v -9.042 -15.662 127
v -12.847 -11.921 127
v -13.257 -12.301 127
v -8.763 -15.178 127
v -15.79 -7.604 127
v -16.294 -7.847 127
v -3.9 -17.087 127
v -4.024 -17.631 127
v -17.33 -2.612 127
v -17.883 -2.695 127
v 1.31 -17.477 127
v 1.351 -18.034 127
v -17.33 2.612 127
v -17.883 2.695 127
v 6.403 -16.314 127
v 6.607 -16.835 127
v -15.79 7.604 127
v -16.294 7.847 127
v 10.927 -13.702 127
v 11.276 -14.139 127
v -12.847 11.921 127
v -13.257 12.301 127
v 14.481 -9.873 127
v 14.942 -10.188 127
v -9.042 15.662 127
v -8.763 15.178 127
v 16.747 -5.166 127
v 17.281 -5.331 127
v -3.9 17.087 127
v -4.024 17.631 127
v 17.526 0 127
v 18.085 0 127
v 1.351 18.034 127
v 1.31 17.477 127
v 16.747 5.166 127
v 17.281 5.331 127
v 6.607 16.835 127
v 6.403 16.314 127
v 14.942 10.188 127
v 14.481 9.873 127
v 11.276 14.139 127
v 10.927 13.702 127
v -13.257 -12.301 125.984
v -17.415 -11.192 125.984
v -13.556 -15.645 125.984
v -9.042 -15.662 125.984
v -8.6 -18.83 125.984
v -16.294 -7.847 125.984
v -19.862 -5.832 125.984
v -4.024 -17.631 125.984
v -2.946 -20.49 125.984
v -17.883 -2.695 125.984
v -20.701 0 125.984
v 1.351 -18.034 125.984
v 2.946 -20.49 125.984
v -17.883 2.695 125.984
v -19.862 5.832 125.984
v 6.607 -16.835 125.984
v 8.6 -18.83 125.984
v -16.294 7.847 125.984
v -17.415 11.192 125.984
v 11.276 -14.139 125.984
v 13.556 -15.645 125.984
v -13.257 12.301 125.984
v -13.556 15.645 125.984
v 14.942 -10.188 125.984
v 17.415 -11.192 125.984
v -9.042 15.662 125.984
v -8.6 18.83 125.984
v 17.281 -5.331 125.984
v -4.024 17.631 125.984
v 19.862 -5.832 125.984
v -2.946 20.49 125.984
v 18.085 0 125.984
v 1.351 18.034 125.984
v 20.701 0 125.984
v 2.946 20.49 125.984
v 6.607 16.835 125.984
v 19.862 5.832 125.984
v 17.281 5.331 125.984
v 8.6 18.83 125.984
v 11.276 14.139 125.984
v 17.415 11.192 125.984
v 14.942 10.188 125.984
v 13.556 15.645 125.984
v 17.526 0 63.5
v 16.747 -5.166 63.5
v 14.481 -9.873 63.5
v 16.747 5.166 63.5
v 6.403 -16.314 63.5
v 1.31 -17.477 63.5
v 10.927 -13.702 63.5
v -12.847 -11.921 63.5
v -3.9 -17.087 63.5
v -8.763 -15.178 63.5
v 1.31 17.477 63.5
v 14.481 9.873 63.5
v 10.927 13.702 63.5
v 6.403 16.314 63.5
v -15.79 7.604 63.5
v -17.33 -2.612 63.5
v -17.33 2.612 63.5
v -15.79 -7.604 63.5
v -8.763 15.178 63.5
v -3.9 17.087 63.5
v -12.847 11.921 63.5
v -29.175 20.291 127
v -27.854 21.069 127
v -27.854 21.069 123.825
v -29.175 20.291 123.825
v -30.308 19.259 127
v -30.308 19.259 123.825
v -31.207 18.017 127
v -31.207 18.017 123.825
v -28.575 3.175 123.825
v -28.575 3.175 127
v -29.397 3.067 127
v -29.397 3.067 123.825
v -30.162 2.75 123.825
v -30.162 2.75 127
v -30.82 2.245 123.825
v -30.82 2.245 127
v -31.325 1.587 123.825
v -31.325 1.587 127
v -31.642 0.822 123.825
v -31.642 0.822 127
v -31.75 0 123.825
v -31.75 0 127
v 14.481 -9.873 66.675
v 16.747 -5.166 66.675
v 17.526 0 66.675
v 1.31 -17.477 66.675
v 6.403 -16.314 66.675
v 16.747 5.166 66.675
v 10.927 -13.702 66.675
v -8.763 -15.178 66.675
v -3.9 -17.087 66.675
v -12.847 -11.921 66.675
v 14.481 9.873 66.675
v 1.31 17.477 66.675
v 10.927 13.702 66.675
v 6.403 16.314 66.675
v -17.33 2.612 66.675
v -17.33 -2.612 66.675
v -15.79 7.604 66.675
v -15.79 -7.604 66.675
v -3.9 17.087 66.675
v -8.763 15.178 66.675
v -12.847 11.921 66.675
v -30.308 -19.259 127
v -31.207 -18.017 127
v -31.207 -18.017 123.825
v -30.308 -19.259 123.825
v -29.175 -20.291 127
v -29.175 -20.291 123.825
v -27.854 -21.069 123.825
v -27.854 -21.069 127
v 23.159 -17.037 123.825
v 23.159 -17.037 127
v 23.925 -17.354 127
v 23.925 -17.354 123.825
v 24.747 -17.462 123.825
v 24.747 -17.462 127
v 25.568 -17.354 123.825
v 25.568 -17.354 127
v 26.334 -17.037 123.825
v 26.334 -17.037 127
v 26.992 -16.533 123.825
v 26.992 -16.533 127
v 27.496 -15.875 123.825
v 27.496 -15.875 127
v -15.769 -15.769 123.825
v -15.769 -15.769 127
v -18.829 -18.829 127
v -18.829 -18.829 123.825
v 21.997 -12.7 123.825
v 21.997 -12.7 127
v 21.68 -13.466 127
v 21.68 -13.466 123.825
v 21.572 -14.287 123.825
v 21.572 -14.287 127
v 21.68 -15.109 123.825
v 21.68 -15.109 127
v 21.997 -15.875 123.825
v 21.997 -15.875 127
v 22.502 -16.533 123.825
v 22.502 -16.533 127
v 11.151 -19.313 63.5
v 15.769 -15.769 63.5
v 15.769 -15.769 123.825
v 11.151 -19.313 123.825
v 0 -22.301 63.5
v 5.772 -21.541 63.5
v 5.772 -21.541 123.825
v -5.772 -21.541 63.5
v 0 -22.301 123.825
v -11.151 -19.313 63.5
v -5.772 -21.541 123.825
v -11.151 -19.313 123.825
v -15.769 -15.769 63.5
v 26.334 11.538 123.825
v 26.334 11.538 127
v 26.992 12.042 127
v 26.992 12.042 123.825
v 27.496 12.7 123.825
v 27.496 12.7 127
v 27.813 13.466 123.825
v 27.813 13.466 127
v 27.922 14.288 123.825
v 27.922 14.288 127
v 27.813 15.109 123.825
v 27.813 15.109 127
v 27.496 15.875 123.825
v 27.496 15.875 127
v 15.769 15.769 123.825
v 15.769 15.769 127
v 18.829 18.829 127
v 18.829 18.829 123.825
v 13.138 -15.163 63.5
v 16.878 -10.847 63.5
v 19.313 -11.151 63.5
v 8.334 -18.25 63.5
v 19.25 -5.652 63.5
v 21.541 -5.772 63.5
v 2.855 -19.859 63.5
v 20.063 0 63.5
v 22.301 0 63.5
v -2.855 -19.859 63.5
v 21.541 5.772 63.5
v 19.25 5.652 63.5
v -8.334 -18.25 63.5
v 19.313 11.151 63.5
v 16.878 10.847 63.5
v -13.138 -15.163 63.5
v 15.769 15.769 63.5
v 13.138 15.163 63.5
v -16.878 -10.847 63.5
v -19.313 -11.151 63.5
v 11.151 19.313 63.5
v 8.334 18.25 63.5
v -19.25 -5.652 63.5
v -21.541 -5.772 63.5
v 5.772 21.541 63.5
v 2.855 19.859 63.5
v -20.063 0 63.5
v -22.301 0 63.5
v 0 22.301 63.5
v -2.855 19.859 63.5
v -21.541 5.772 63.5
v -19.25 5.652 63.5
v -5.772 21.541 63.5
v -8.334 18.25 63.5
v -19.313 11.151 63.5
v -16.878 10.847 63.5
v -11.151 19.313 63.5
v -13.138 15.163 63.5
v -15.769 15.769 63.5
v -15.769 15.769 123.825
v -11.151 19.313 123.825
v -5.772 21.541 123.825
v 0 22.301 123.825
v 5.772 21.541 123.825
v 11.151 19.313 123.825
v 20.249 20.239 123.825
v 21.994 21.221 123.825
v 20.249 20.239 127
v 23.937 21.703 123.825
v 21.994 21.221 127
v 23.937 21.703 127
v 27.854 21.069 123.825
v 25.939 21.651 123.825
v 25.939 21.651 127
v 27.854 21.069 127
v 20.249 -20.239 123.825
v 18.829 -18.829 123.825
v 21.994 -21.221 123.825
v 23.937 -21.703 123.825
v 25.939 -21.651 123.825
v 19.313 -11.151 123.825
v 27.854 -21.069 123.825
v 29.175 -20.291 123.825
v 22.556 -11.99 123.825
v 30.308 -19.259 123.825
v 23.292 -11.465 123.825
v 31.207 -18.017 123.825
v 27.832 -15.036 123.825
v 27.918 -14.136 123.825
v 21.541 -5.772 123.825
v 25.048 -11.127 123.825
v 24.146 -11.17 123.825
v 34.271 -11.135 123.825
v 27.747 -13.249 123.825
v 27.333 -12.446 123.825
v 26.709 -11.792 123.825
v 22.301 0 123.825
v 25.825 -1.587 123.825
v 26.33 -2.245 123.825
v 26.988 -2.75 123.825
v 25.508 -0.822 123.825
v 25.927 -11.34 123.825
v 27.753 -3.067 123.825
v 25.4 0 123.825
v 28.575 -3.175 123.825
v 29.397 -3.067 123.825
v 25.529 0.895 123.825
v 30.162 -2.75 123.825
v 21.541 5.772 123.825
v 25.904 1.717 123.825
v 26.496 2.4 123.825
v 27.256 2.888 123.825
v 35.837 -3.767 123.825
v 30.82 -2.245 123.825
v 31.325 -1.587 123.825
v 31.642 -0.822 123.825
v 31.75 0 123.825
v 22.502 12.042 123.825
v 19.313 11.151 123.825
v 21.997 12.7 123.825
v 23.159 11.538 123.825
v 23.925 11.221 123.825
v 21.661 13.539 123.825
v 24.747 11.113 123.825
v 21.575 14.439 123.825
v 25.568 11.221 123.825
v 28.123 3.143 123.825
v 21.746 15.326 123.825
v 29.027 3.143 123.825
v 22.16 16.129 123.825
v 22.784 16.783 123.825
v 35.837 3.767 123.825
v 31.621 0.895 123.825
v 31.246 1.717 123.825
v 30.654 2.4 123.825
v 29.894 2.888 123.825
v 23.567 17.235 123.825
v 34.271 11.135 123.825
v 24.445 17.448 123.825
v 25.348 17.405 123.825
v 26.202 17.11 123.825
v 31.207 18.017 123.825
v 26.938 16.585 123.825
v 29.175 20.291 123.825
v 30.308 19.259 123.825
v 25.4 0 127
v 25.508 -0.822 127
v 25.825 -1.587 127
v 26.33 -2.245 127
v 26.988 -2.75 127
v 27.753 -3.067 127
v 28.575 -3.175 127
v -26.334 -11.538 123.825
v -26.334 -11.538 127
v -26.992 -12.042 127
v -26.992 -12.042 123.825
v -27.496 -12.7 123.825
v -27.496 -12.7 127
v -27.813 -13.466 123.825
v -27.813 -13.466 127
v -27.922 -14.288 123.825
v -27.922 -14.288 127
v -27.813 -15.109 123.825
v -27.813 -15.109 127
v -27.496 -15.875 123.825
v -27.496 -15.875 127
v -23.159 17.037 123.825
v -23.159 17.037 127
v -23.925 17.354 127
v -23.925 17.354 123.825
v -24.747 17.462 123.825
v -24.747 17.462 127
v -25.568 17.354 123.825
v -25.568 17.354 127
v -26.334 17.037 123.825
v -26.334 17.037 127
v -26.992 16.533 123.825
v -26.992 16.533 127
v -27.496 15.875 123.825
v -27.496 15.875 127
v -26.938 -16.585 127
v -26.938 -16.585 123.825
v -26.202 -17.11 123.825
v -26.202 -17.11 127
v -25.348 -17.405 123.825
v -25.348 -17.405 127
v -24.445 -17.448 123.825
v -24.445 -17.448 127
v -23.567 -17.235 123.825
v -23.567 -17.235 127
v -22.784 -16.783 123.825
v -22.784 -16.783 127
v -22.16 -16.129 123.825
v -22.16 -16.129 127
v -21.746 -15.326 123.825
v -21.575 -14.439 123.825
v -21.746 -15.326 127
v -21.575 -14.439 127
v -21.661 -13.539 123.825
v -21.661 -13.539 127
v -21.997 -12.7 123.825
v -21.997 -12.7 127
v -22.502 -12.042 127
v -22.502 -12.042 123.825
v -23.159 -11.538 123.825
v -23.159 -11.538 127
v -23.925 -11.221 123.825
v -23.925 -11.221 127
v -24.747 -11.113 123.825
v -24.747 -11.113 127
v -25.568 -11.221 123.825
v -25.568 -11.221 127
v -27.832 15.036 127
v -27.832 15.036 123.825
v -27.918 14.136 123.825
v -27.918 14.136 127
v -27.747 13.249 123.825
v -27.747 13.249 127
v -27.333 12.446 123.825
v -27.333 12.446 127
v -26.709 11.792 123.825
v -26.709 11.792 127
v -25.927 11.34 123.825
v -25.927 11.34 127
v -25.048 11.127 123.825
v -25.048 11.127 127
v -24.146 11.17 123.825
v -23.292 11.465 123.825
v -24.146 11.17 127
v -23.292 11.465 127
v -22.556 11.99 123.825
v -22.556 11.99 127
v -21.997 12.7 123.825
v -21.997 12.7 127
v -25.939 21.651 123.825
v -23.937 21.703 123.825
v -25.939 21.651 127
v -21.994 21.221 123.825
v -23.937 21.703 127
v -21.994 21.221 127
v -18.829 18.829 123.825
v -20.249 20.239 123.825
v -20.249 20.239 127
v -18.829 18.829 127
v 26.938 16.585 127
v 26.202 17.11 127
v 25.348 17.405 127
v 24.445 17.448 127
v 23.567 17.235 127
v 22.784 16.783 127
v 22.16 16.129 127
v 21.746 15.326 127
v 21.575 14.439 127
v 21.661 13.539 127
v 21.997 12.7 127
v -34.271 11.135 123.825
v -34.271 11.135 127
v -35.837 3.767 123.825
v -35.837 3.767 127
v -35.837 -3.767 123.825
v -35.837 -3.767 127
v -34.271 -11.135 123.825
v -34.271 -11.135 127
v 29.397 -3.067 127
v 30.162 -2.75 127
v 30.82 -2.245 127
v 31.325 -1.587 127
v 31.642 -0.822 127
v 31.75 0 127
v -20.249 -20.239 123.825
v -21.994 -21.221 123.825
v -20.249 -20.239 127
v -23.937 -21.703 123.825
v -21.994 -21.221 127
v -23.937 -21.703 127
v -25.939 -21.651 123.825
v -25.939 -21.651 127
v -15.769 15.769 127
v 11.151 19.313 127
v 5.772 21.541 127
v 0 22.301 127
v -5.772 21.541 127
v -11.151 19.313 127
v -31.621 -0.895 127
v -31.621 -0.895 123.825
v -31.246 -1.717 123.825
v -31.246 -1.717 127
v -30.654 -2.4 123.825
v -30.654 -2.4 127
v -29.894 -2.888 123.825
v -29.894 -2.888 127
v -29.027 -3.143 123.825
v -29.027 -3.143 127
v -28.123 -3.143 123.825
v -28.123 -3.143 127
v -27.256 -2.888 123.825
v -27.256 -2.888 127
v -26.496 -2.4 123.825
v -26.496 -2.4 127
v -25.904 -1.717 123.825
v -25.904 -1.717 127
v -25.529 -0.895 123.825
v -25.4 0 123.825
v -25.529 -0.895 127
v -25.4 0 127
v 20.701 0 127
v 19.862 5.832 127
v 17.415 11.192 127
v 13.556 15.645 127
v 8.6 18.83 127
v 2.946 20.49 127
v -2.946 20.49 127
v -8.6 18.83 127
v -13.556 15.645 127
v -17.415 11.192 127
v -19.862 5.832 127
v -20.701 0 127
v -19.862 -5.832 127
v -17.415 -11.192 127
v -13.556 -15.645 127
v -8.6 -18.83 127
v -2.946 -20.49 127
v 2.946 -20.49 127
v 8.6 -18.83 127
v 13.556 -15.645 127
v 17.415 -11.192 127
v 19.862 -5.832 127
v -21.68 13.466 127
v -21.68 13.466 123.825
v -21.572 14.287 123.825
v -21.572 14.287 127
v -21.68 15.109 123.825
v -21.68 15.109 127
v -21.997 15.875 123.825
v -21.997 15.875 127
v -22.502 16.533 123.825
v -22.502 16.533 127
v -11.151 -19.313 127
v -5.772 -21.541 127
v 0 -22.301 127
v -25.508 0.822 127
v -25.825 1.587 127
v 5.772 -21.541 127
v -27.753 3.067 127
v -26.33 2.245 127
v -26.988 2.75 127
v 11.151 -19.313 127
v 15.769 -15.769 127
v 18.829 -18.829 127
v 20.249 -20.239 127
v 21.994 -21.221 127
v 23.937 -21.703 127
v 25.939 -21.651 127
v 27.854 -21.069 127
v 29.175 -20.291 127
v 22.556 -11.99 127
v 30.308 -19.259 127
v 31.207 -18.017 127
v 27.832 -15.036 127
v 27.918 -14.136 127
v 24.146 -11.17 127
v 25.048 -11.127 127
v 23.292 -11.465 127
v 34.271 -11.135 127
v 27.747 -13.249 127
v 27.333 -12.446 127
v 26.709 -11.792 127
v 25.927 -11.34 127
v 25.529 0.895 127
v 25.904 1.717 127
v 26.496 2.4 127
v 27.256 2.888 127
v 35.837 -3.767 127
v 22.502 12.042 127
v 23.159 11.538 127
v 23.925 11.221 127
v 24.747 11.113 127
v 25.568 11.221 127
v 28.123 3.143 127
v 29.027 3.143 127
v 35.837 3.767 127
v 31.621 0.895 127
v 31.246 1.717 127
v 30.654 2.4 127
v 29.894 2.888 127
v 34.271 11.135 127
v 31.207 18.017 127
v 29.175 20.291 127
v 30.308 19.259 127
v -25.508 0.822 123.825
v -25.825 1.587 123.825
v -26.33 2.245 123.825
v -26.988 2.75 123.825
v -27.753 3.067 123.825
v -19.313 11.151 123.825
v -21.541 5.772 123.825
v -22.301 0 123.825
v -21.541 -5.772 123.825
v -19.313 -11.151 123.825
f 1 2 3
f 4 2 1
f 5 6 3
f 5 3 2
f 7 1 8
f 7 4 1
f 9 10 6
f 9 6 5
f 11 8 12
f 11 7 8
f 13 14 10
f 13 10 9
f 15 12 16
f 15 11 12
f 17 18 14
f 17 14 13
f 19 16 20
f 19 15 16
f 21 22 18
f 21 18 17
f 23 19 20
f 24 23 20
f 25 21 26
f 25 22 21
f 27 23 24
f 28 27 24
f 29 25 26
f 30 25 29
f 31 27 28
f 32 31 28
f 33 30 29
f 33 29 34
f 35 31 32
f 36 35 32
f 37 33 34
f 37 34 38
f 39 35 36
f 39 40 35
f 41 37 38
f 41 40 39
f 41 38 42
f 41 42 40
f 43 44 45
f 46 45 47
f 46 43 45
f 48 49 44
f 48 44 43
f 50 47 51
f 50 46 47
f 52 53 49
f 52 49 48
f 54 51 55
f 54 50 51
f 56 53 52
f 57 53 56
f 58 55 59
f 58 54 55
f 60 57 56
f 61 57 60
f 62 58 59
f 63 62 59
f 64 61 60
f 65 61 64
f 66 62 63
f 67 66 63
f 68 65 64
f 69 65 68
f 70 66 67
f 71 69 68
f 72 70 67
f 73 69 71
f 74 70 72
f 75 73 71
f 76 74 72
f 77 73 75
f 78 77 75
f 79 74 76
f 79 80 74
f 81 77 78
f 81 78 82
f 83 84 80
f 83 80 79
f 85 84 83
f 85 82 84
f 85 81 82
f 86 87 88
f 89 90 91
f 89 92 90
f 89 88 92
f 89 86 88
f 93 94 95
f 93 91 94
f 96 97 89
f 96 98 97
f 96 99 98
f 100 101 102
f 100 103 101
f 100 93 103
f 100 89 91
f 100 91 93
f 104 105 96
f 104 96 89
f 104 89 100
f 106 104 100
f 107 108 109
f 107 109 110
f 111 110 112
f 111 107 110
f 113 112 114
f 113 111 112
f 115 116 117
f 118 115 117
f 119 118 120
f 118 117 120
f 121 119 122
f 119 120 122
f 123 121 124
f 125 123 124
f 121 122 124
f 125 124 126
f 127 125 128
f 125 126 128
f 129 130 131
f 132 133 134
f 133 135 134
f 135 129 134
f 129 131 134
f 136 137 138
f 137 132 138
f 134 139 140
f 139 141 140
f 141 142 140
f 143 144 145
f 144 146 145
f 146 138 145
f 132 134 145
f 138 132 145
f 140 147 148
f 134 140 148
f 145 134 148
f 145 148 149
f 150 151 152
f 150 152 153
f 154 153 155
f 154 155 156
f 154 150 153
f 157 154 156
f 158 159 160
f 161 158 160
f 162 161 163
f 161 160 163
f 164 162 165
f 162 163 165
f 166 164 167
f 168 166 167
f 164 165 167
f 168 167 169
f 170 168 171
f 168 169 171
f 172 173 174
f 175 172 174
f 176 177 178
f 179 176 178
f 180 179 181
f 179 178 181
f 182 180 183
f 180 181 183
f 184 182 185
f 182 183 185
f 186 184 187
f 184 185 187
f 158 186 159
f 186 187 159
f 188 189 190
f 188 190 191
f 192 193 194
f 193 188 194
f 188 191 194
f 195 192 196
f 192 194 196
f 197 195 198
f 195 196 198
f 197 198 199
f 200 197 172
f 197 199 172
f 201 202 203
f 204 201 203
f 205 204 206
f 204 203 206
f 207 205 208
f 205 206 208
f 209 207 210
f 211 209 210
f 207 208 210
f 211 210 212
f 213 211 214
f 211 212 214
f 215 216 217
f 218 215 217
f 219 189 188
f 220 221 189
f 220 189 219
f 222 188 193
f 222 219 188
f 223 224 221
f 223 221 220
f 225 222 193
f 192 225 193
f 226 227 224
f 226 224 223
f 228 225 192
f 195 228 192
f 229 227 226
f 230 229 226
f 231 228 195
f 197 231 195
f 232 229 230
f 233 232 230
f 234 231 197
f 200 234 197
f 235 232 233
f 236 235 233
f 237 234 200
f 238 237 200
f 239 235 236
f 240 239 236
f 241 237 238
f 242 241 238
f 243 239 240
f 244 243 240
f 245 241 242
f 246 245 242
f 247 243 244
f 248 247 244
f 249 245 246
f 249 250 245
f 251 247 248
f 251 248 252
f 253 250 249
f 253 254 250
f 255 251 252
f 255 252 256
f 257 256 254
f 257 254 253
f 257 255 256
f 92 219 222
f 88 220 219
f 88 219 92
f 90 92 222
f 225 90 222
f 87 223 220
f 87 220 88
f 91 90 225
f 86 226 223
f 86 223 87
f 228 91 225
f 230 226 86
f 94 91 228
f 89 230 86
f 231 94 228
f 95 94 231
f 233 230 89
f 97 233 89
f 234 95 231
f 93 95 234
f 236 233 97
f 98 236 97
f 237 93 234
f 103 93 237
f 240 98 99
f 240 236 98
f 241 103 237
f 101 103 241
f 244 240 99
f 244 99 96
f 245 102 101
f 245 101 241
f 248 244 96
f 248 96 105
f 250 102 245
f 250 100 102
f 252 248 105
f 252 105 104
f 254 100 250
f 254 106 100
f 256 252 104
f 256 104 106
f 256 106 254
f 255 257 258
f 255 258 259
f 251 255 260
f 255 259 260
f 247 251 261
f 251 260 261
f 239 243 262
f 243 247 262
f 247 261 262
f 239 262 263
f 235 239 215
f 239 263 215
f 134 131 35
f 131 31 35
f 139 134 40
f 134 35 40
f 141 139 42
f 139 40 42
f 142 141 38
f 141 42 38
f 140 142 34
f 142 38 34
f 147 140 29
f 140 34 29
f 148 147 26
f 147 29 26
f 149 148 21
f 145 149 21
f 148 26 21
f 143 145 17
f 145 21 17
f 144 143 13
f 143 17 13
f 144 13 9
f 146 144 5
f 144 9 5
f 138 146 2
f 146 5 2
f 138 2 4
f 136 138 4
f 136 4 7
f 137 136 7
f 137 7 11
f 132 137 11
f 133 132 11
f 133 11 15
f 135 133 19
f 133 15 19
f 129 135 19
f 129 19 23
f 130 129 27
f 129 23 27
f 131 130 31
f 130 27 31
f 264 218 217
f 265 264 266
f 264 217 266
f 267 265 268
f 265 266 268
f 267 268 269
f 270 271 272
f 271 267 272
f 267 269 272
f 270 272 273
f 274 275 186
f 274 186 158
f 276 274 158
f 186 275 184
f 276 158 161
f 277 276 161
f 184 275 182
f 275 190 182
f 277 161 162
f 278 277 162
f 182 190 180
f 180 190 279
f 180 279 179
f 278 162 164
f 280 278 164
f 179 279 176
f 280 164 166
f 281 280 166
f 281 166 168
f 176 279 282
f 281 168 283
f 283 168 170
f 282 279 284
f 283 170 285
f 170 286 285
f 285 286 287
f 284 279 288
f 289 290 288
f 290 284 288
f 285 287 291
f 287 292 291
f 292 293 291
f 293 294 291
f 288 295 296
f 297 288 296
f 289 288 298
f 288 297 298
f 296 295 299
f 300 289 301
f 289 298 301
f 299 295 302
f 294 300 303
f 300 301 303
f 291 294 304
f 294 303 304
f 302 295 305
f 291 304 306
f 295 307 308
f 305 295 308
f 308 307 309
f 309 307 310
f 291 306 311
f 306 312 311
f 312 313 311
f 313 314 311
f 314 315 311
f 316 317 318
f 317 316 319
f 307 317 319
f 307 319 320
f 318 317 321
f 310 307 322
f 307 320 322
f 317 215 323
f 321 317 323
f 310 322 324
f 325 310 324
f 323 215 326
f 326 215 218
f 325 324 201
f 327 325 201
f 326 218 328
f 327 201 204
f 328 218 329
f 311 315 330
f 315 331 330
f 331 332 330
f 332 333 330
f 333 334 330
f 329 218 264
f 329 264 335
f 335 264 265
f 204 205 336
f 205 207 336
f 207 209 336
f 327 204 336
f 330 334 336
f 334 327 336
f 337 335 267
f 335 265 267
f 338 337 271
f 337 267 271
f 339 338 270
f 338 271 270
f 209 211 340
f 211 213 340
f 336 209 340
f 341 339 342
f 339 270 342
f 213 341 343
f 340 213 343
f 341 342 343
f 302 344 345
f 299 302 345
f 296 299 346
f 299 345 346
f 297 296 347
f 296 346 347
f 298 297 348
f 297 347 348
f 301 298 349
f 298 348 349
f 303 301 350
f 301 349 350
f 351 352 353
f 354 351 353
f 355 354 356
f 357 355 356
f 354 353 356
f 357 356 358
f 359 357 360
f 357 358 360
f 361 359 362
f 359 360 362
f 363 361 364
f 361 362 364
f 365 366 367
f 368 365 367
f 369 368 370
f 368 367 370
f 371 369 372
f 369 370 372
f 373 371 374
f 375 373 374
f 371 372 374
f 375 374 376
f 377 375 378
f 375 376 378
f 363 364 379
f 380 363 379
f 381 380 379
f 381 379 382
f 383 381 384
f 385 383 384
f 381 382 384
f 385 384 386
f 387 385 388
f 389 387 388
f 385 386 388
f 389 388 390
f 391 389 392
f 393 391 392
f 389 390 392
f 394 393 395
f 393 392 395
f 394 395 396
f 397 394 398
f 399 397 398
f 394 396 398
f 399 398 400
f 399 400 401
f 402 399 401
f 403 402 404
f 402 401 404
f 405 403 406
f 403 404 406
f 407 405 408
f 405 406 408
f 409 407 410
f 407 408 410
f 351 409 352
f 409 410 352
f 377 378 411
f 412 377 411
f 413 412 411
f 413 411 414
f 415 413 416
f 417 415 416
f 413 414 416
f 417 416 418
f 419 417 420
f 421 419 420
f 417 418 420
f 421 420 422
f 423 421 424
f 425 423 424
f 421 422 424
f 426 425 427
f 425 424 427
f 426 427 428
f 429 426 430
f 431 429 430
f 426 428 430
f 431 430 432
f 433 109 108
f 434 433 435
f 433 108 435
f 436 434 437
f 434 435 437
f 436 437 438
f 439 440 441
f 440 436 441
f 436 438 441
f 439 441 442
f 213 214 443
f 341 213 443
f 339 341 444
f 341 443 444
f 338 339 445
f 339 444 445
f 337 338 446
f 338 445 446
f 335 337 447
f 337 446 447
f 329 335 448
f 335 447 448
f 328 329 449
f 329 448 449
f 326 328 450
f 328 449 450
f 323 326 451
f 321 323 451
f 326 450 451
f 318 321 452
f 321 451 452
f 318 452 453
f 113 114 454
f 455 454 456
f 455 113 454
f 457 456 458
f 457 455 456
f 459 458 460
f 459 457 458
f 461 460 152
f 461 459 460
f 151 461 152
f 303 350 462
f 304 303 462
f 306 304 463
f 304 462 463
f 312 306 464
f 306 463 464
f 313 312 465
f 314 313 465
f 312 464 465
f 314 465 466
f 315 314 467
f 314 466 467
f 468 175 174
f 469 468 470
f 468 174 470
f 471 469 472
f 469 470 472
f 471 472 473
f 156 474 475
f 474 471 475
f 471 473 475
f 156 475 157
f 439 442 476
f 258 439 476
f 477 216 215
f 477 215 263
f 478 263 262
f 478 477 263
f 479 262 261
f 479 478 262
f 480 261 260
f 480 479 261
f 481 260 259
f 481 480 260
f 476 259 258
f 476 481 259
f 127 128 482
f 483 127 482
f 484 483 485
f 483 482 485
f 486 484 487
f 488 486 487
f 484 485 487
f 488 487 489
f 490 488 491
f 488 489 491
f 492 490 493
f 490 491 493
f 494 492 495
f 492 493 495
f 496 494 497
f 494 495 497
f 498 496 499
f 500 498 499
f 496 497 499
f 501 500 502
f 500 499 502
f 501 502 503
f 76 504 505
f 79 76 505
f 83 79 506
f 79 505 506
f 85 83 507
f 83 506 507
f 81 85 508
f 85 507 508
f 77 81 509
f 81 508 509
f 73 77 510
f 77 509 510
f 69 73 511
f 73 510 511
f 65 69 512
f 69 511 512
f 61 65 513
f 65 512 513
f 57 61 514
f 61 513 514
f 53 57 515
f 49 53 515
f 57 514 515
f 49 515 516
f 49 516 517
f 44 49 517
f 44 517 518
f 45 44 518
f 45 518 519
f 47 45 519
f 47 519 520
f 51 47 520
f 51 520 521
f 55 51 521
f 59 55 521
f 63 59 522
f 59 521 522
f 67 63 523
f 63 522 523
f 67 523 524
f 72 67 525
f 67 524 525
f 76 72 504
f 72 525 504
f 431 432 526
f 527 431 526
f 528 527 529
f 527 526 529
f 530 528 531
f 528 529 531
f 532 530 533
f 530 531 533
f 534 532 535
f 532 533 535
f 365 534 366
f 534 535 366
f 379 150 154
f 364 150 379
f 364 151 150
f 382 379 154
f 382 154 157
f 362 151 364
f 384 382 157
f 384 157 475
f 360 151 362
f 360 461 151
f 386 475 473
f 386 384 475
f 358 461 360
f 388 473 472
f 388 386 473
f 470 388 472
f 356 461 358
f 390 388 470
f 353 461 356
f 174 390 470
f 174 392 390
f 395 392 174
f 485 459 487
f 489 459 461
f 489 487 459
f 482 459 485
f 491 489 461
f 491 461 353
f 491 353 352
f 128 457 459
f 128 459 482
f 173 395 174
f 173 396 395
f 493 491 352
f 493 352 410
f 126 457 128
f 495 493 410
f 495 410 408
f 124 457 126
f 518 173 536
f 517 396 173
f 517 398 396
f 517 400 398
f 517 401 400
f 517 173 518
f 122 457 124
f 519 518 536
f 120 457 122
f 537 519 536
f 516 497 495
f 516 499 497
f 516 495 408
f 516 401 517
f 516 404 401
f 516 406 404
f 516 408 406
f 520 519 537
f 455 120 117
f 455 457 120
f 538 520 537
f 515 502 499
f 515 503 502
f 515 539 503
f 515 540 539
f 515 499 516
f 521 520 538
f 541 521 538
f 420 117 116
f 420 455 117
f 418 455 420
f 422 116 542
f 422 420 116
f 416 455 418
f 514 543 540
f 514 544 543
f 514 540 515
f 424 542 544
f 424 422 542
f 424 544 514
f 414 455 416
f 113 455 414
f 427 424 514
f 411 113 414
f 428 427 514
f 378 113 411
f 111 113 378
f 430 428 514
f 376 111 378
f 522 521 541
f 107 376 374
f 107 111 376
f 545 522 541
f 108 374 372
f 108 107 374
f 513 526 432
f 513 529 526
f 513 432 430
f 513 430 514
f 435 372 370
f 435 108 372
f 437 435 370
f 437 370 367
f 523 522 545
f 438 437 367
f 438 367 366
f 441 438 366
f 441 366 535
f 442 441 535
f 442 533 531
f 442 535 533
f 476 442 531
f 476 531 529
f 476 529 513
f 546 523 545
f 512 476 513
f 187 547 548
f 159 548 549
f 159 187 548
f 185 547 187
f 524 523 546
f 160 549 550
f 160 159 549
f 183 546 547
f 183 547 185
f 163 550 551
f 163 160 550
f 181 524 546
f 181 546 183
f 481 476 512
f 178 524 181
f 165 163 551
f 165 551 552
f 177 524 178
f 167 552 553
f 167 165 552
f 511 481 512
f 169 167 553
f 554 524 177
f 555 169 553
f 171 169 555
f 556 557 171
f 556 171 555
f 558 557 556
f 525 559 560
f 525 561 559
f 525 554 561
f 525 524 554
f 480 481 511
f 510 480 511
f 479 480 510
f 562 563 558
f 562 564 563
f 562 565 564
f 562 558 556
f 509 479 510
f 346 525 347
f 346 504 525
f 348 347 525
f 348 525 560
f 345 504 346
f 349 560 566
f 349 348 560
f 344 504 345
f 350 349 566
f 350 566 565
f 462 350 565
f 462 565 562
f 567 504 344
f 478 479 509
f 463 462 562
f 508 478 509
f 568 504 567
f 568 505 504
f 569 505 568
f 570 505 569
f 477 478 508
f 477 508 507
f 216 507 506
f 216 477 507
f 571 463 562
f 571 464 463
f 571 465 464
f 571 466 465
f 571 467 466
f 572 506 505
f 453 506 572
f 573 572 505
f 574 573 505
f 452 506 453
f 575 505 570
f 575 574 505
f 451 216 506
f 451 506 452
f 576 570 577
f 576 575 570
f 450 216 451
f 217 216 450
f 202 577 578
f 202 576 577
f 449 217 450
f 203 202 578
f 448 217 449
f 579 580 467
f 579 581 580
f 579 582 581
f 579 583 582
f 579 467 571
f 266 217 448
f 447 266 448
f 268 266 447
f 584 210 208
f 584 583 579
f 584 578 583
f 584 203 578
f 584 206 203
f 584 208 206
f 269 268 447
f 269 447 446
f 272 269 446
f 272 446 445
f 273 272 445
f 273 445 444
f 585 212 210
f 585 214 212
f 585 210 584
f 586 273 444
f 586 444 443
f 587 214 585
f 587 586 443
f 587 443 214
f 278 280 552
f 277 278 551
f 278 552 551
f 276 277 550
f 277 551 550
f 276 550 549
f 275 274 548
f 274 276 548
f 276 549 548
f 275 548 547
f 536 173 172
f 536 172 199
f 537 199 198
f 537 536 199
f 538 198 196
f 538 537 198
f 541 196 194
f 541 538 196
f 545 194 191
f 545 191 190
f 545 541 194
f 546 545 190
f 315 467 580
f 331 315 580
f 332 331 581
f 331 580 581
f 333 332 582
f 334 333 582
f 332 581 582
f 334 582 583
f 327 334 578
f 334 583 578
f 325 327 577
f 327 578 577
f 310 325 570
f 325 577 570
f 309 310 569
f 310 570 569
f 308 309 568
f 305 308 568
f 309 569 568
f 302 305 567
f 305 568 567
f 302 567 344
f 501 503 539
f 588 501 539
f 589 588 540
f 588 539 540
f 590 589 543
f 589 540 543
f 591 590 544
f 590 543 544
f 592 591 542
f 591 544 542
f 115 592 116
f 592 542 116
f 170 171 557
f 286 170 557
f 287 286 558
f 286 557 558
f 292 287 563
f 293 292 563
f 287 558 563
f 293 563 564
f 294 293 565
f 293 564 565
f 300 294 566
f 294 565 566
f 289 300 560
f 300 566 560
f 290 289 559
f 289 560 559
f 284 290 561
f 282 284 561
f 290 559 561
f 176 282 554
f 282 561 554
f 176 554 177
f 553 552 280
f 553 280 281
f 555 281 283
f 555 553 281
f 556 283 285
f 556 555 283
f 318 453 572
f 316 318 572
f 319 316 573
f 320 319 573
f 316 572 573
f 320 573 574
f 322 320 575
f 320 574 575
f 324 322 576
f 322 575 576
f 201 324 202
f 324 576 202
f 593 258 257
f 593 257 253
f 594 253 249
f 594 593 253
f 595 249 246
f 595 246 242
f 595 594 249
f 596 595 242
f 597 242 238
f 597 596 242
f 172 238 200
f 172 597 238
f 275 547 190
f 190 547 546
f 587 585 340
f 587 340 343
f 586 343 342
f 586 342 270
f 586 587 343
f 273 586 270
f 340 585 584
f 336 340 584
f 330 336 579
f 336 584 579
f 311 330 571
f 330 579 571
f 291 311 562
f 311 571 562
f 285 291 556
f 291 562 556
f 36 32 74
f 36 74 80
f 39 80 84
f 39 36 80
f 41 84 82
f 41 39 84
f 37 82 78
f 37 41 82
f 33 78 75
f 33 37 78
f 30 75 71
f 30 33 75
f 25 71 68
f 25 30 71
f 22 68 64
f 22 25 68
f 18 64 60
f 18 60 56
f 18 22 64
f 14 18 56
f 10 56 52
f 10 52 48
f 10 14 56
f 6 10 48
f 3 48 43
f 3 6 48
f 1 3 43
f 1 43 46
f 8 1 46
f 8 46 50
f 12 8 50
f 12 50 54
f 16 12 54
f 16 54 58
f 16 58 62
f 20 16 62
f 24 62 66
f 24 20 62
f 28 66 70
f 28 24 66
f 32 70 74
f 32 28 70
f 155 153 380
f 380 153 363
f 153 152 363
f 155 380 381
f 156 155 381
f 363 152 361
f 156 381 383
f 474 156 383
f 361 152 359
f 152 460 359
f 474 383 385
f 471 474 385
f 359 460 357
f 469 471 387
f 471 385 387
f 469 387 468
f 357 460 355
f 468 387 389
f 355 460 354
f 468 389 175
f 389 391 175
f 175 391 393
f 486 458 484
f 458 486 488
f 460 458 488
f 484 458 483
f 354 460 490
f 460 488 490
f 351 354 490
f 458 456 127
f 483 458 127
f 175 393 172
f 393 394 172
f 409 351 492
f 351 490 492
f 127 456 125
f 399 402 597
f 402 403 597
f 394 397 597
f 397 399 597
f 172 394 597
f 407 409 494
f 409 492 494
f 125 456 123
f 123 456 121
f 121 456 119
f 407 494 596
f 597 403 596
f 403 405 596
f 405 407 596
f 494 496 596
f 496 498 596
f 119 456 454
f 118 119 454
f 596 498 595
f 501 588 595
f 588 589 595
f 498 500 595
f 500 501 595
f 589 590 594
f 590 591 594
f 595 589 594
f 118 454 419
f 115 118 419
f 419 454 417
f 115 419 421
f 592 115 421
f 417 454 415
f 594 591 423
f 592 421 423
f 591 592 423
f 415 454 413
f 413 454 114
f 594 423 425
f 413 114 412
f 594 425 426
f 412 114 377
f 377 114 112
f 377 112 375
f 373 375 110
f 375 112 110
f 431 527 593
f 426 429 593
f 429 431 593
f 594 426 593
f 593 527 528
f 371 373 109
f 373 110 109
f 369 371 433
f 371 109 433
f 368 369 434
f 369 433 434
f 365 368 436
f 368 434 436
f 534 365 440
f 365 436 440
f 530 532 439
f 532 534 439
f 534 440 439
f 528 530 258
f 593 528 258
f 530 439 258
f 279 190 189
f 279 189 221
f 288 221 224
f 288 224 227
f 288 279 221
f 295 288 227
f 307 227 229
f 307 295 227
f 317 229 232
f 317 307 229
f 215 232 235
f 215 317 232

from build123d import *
from build123d.topology import SkipClean

# Parameters (mm, degrees)
SKETCH1_R           = 21.082
SKETCH1_R_2         = 17.526
BOSS_EXTRUDE1_DEPTH = 254
BOSS_EXTRUDE2_START = 6.35
SKETCH2_R           = 21.082
BOSS_EXTRUDE2_DEPTH = 6.35
SKETCH3_R           = 25.868376463
CUT_EXTRUDE1_DEPTH  = 127
SKETCH4_R           = 34.925
SKETCH4_R_2         = 19.091061219
BOSS_EXTRUDE3_DEPTH = 3.175
CUT_EXTRUDE2_DEPTH  = 143.203142546
CIRPATTERN1_COUNT   = 12
SKETCH6_R           = 21.082
CUT_EXTRUDE3_DEPTH  = 6.35
SKETCH7_R           = 21.082
BOSS_EXTRUDE4_DEPTH = 6.35
CUT_EXTRUDE5_DEPTH  = 137.26632471
BOSS_EXTRUDE5_DEPTH = 3.175
SKETCH13_R          = 20.701
SKETCH13_R_2        = 18.0848
CUT_EXTRUDE6_DEPTH  = 1.016
SKETCH14_R          = 22.3012
SKETCH14_R_2        = 20.701
BOSS_EXTRUDE6_DEPTH = 3.175
SKETCH15_R          = 3.175
SKETCH15_R_2        = 21.082
BOSS_EXTRUDE7_DEPTH = 123.825
SKETCH17_R          = 47.464750001
SKETCH17_R_2        = 22.3012
CUT_EXTRUDE7_DEPTH  = 120.65
SKETCH18_R          = 17.526
CUT_EXTRUDE8_DEPTH  = 134.883658048
CUT_EXTRUDE9_START  = -1.016
SKETCH19_R          = 20.701
SKETCH19_R_2        = 18.0848
CUT_EXTRUDE9_DEPTH  = 1.016
SKETCH20_R          = 43.35542212
CUT_EXTRUDE10_DEPTH = 25.4
SKETCH21_R          = 25.927665562
CUT_EXTRUDE11_DEPTH = 38.1
SKETCH22_R          = 20.063036937
BOSS_EXTRUDE8_DEPTH = 3.175


with BuildPart() as part:
    # Sketch1 → Boss-Extrude1 (new body)
    with BuildSketch(Plane.XY):
        Circle(SKETCH1_R)
        Circle(SKETCH1_R_2, mode=Mode.SUBTRACT)
    extrude(amount=BOSS_EXTRUDE1_DEPTH)

    # Sketch2 → Boss-Extrude2 (add)
    with BuildSketch(Plane(origin=(0, 0, 0), x_dir=(-1, 0, 0), z_dir=(0, 0, -1)).offset(BOSS_EXTRUDE2_START)):
        Circle(SKETCH2_R)
    extrude(amount=-BOSS_EXTRUDE2_DEPTH)

    # Sketch3 → Cut-Extrude1 (cut)
    with BuildSketch(Plane.XY.offset(254)):
        Circle(SKETCH3_R)
    extrude(amount=-CUT_EXTRUDE1_DEPTH, mode=Mode.SUBTRACT)

    # Sketch4 → Boss-Extrude3 (add)
    with BuildSketch(Plane.XY.offset(127)):
        Circle(SKETCH4_R)
        Circle(SKETCH4_R_2, mode=Mode.SUBTRACT)
    extrude(amount=-BOSS_EXTRUDE3_DEPTH)

    # Sketch5 → Cut-Extrude2 (cut, through all)
    with BuildSketch(Plane.XY.offset(127)):
        with BuildLine():
            ThreePointArc((0, 31.75), (-3.175, 28.575), (0, 25.4))
            Line((0, 25.4), (0, 31.75))
        make_face()
        with BuildLine():
            Line((0, 31.75), (0, 25.4))
            ThreePointArc((0, 25.4), (2.24506403, 26.32993597), (3.175, 28.575))
            ThreePointArc((3.175, 28.575), (2.24506403, 30.82006403), (0, 31.75))
        make_face()
    cut_extrude2 = extrude(amount=-CUT_EXTRUDE2_DEPTH, mode=Mode.SUBTRACT)

    # CirPattern1: Cut-Extrude2 ×12 about axis
    cirpattern1_axis = Axis((0, 0, 0), (0, 0, 1))
    for i in range(1, CIRPATTERN1_COUNT):
        add(cut_extrude2.rotate(cirpattern1_axis, i * 360 / CIRPATTERN1_COUNT), mode=Mode.SUBTRACT)

    # Sketch6 → Cut-Extrude3 (cut)
    with BuildSketch(Plane(origin=(0, 0, -6.35), x_dir=(-1, 0, 0), z_dir=(0, 0, -1))):
        Circle(SKETCH6_R)
    extrude(amount=-CUT_EXTRUDE3_DEPTH, mode=Mode.SUBTRACT)

    # Sketch7 → Boss-Extrude4 (add)
    with BuildSketch(Plane(origin=(0, 0, 0), x_dir=(-1, 0, 0), z_dir=(0, 0, -1))):
        Circle(SKETCH7_R)
    extrude(amount=-BOSS_EXTRUDE4_DEPTH)

    # Sketch8 → Cut-Extrude5 (cut, through all)
    with BuildSketch(Plane.XY.offset(127)):
        with BuildLine():
            ThreePointArc((18.828599641, 18.828599641), (22.949516837, 21.527350272), (27.854121372, 21.069018667))
            ThreePointArc((27.854121372, 21.069018667), (0, 34.925), (-27.854121372, 21.069018667))
            ThreePointArc((-27.854121372, 21.069018667), (-22.949516837, 21.527350272), (-18.828599641, 18.828599641))
            Line((-18.828599641, 18.828599641), (-14.907225161, 14.907225161))
            ThreePointArc((-14.907225161, 14.907225161), (0, 21.082), (14.907225161, 14.907225161))
            Line((14.907225161, 14.907225161), (18.828599641, 18.828599641))
        make_face()
        with BuildLine():
            ThreePointArc((14.907225161, -14.907225161), (0, -21.082), (-14.907225161, -14.907225161))
            Line((-14.907225161, -14.907225161), (-18.828599641, -18.828599641))
            ThreePointArc((-18.828599641, -18.828599641), (-22.949516837, -21.527350272), (-27.854121372, -21.069018667))
            ThreePointArc((-27.854121372, -21.069018667), (0, -34.925), (27.854121372, -21.069018667))
            ThreePointArc((27.854121372, -21.069018667), (22.949516837, -21.527350272), (18.828599641, -18.828599641))
            Line((18.828599641, -18.828599641), (14.907225161, -14.907225161))
        make_face()
    extrude(amount=-CUT_EXTRUDE5_DEPTH, mode=Mode.SUBTRACT)

    # Sketch11 → Boss-Extrude5 (add)
    with BuildSketch(Plane.XY.offset(127)):
        with BuildLine():
            ThreePointArc((31.206854634, 18.017286001), (29.767943301, 19.804028486), (27.854121372, 21.069018667))
            ThreePointArc((27.854121372, 21.069018667), (34.925, 0), (27.854121372, -21.069018667))
            ThreePointArc((27.854121372, -21.069018667), (29.767943301, -19.804028486), (31.206854634, -18.017286001))
            ThreePointArc((31.206854634, -18.017286001), (36.034571885, 0), (31.206854634, 18.017286001))
        make_face()
        with BuildLine():
            ThreePointArc((-27.854121372, 21.069018667), (-29.767943301, 19.804028486), (-31.206854634, 18.017286001))
            ThreePointArc((-31.206854634, 18.017286001), (-36.034571885, -1.77e-07), (-31.206854456, -18.017286308))
            ThreePointArc((-31.206854456, -18.017286308), (-29.767943169, -19.804028605), (-27.854121372, -21.069018667))
            ThreePointArc((-27.854121372, -21.069018667), (-34.925, 0), (-27.854121372, 21.069018667))
        make_face()
    extrude(amount=-BOSS_EXTRUDE5_DEPTH)

    # Sketch13 → Cut-Extrude6 (cut)
    with BuildSketch(Plane.XY.offset(127)):
        Circle(SKETCH13_R)
        Circle(SKETCH13_R_2, mode=Mode.SUBTRACT)
    extrude(amount=-CUT_EXTRUDE6_DEPTH, mode=Mode.SUBTRACT)

    # Sketch14 → Boss-Extrude6 (add)
    with BuildSketch(Plane.XY.offset(127)):
        Circle(SKETCH14_R)
        Circle(SKETCH14_R_2, mode=Mode.SUBTRACT)
    extrude(amount=-BOSS_EXTRUDE6_DEPTH)

    # Sketch15 → Boss-Extrude7 (add)
    with BuildSketch(Plane(origin=(0, 0, 123.825), x_dir=(-1, 0, 0), z_dir=(0, 0, -1))):
        with BuildLine():
            ThreePointArc((31.206854667, 18.017285943), (25.234555257, 21.731100369), (18.828599641, 18.828599641))
            Line((18.828599641, 18.828599641), (15.769329749, 15.769329749))
            ThreePointArc((15.769329749, 15.769329749), (0, 22.3012), (-15.769329749, 15.769329749))
            Line((-15.769329749, 15.769329749), (-18.828599641, 18.828599641))
            ThreePointArc((-18.828599641, 18.828599641), (-25.234555257, 21.731100369), (-31.206854667, 18.017285943))
            ThreePointArc((-31.206854667, 18.017285943), (-36.034571885, 0), (-31.206854667, -18.017285943))
            ThreePointArc((-31.206854667, -18.017285943), (-25.234555257, -21.731100369), (-18.828599641, -18.828599641))
            Line((-18.828599641, -18.828599641), (-15.769329749, -15.769329749))
            ThreePointArc((-15.769329749, -15.769329749), (0, -22.3012), (15.769329749, -15.769329749))
            Line((15.769329749, -15.769329749), (18.828599641, -18.828599641))
            ThreePointArc((18.828599641, -18.828599641), (25.234555257, -21.731100369), (31.206854667, -18.017285943))
            ThreePointArc((31.206854667, -18.017285943), (36.034571885, 0), (31.206854667, 18.017285943))
        make_face()
        with Locations(Location((28.575, 0, 0), (0, 0, 90))):
            Circle(SKETCH15_R, mode=Mode.SUBTRACT)
        with Locations(Location((-24.746675913, -14.2875, 0), (0, 0, 300))):
            Circle(SKETCH15_R, mode=Mode.SUBTRACT)
        with Locations(Location((-24.746675913, 14.2875, 0), (0, 0, 240))):
            Circle(SKETCH15_R, mode=Mode.SUBTRACT)
        with Locations(Location((-28.575, 0, 0), (0, 0, 270))):
            Circle(SKETCH15_R, mode=Mode.SUBTRACT)
        Circle(SKETCH15_R_2, mode=Mode.SUBTRACT)
        with Locations(Location((24.746675913, -14.2875, 0), (0, 0, 60))):
            Circle(SKETCH15_R, mode=Mode.SUBTRACT)
        with Locations(Location((24.746675913, 14.2875, 0), (0, 0, 120))):
            Circle(SKETCH15_R, mode=Mode.SUBTRACT)
    extrude(amount=BOSS_EXTRUDE7_DEPTH)

    # Sketch17 → Cut-Extrude7 (cut)
    with BuildSketch(Plane.XY.offset(123.825)):
        Circle(SKETCH17_R)
        with Locations(Location((0, 0, 0), (0, 0, 315))):
            Circle(SKETCH17_R_2, mode=Mode.SUBTRACT)
    extrude(amount=-CUT_EXTRUDE7_DEPTH, mode=Mode.SUBTRACT)

    # Sketch18 → Cut-Extrude8 (cut, through all)
    with BuildSketch(Plane.XY.offset(127)):
        Circle(SKETCH18_R)
    extrude(amount=-CUT_EXTRUDE8_DEPTH, mode=Mode.SUBTRACT)

    # Sketch19 → Cut-Extrude9 (cut)
    with BuildSketch(Plane(origin=(0, 0, 0), x_dir=(-1, 0, 0), z_dir=(0, 0, -1)).offset(CUT_EXTRUDE9_START)):
        with Locations(Location((0, 0, 0), (0, 0, 180))):
            Circle(SKETCH19_R)
        with Locations(Location((0, 0, 0), (0, 0, 180))):
            Circle(SKETCH19_R_2, mode=Mode.SUBTRACT)
    extrude(amount=CUT_EXTRUDE9_DEPTH, mode=Mode.SUBTRACT)

    # Sketch20 → Cut-Extrude10 (cut)
    with SkipClean():  # the faces are left unmerged after this step: merging them gives an invalid solid
        with BuildSketch(Plane(origin=(0, 0, 0), x_dir=(-1, 0, 0), z_dir=(0, 0, -1))):
            Circle(SKETCH20_R)
        extrude(amount=-CUT_EXTRUDE10_DEPTH, mode=Mode.SUBTRACT)

    # Sketch21 → Cut-Extrude11 (cut)
    with SkipClean():  # the faces are left unmerged after this step: merging them gives an invalid solid
        with BuildSketch(Plane(origin=(0, 0, 25.4), x_dir=(-1, 0, 0), z_dir=(0, 0, -1))):
            Circle(SKETCH21_R)
        extrude(amount=-CUT_EXTRUDE11_DEPTH, mode=Mode.SUBTRACT)

    # Sketch22 → Boss-Extrude8 (add)
    with SkipClean():  # the faces are left unmerged after this step: merging them gives an invalid solid
        with BuildSketch(Plane(origin=(0, 0, 63.5), x_dir=(-1, 0, 0), z_dir=(0, 0, -1))):
            Circle(SKETCH22_R)
        extrude(amount=-BOSS_EXTRUDE8_DEPTH)


solid = part.part
